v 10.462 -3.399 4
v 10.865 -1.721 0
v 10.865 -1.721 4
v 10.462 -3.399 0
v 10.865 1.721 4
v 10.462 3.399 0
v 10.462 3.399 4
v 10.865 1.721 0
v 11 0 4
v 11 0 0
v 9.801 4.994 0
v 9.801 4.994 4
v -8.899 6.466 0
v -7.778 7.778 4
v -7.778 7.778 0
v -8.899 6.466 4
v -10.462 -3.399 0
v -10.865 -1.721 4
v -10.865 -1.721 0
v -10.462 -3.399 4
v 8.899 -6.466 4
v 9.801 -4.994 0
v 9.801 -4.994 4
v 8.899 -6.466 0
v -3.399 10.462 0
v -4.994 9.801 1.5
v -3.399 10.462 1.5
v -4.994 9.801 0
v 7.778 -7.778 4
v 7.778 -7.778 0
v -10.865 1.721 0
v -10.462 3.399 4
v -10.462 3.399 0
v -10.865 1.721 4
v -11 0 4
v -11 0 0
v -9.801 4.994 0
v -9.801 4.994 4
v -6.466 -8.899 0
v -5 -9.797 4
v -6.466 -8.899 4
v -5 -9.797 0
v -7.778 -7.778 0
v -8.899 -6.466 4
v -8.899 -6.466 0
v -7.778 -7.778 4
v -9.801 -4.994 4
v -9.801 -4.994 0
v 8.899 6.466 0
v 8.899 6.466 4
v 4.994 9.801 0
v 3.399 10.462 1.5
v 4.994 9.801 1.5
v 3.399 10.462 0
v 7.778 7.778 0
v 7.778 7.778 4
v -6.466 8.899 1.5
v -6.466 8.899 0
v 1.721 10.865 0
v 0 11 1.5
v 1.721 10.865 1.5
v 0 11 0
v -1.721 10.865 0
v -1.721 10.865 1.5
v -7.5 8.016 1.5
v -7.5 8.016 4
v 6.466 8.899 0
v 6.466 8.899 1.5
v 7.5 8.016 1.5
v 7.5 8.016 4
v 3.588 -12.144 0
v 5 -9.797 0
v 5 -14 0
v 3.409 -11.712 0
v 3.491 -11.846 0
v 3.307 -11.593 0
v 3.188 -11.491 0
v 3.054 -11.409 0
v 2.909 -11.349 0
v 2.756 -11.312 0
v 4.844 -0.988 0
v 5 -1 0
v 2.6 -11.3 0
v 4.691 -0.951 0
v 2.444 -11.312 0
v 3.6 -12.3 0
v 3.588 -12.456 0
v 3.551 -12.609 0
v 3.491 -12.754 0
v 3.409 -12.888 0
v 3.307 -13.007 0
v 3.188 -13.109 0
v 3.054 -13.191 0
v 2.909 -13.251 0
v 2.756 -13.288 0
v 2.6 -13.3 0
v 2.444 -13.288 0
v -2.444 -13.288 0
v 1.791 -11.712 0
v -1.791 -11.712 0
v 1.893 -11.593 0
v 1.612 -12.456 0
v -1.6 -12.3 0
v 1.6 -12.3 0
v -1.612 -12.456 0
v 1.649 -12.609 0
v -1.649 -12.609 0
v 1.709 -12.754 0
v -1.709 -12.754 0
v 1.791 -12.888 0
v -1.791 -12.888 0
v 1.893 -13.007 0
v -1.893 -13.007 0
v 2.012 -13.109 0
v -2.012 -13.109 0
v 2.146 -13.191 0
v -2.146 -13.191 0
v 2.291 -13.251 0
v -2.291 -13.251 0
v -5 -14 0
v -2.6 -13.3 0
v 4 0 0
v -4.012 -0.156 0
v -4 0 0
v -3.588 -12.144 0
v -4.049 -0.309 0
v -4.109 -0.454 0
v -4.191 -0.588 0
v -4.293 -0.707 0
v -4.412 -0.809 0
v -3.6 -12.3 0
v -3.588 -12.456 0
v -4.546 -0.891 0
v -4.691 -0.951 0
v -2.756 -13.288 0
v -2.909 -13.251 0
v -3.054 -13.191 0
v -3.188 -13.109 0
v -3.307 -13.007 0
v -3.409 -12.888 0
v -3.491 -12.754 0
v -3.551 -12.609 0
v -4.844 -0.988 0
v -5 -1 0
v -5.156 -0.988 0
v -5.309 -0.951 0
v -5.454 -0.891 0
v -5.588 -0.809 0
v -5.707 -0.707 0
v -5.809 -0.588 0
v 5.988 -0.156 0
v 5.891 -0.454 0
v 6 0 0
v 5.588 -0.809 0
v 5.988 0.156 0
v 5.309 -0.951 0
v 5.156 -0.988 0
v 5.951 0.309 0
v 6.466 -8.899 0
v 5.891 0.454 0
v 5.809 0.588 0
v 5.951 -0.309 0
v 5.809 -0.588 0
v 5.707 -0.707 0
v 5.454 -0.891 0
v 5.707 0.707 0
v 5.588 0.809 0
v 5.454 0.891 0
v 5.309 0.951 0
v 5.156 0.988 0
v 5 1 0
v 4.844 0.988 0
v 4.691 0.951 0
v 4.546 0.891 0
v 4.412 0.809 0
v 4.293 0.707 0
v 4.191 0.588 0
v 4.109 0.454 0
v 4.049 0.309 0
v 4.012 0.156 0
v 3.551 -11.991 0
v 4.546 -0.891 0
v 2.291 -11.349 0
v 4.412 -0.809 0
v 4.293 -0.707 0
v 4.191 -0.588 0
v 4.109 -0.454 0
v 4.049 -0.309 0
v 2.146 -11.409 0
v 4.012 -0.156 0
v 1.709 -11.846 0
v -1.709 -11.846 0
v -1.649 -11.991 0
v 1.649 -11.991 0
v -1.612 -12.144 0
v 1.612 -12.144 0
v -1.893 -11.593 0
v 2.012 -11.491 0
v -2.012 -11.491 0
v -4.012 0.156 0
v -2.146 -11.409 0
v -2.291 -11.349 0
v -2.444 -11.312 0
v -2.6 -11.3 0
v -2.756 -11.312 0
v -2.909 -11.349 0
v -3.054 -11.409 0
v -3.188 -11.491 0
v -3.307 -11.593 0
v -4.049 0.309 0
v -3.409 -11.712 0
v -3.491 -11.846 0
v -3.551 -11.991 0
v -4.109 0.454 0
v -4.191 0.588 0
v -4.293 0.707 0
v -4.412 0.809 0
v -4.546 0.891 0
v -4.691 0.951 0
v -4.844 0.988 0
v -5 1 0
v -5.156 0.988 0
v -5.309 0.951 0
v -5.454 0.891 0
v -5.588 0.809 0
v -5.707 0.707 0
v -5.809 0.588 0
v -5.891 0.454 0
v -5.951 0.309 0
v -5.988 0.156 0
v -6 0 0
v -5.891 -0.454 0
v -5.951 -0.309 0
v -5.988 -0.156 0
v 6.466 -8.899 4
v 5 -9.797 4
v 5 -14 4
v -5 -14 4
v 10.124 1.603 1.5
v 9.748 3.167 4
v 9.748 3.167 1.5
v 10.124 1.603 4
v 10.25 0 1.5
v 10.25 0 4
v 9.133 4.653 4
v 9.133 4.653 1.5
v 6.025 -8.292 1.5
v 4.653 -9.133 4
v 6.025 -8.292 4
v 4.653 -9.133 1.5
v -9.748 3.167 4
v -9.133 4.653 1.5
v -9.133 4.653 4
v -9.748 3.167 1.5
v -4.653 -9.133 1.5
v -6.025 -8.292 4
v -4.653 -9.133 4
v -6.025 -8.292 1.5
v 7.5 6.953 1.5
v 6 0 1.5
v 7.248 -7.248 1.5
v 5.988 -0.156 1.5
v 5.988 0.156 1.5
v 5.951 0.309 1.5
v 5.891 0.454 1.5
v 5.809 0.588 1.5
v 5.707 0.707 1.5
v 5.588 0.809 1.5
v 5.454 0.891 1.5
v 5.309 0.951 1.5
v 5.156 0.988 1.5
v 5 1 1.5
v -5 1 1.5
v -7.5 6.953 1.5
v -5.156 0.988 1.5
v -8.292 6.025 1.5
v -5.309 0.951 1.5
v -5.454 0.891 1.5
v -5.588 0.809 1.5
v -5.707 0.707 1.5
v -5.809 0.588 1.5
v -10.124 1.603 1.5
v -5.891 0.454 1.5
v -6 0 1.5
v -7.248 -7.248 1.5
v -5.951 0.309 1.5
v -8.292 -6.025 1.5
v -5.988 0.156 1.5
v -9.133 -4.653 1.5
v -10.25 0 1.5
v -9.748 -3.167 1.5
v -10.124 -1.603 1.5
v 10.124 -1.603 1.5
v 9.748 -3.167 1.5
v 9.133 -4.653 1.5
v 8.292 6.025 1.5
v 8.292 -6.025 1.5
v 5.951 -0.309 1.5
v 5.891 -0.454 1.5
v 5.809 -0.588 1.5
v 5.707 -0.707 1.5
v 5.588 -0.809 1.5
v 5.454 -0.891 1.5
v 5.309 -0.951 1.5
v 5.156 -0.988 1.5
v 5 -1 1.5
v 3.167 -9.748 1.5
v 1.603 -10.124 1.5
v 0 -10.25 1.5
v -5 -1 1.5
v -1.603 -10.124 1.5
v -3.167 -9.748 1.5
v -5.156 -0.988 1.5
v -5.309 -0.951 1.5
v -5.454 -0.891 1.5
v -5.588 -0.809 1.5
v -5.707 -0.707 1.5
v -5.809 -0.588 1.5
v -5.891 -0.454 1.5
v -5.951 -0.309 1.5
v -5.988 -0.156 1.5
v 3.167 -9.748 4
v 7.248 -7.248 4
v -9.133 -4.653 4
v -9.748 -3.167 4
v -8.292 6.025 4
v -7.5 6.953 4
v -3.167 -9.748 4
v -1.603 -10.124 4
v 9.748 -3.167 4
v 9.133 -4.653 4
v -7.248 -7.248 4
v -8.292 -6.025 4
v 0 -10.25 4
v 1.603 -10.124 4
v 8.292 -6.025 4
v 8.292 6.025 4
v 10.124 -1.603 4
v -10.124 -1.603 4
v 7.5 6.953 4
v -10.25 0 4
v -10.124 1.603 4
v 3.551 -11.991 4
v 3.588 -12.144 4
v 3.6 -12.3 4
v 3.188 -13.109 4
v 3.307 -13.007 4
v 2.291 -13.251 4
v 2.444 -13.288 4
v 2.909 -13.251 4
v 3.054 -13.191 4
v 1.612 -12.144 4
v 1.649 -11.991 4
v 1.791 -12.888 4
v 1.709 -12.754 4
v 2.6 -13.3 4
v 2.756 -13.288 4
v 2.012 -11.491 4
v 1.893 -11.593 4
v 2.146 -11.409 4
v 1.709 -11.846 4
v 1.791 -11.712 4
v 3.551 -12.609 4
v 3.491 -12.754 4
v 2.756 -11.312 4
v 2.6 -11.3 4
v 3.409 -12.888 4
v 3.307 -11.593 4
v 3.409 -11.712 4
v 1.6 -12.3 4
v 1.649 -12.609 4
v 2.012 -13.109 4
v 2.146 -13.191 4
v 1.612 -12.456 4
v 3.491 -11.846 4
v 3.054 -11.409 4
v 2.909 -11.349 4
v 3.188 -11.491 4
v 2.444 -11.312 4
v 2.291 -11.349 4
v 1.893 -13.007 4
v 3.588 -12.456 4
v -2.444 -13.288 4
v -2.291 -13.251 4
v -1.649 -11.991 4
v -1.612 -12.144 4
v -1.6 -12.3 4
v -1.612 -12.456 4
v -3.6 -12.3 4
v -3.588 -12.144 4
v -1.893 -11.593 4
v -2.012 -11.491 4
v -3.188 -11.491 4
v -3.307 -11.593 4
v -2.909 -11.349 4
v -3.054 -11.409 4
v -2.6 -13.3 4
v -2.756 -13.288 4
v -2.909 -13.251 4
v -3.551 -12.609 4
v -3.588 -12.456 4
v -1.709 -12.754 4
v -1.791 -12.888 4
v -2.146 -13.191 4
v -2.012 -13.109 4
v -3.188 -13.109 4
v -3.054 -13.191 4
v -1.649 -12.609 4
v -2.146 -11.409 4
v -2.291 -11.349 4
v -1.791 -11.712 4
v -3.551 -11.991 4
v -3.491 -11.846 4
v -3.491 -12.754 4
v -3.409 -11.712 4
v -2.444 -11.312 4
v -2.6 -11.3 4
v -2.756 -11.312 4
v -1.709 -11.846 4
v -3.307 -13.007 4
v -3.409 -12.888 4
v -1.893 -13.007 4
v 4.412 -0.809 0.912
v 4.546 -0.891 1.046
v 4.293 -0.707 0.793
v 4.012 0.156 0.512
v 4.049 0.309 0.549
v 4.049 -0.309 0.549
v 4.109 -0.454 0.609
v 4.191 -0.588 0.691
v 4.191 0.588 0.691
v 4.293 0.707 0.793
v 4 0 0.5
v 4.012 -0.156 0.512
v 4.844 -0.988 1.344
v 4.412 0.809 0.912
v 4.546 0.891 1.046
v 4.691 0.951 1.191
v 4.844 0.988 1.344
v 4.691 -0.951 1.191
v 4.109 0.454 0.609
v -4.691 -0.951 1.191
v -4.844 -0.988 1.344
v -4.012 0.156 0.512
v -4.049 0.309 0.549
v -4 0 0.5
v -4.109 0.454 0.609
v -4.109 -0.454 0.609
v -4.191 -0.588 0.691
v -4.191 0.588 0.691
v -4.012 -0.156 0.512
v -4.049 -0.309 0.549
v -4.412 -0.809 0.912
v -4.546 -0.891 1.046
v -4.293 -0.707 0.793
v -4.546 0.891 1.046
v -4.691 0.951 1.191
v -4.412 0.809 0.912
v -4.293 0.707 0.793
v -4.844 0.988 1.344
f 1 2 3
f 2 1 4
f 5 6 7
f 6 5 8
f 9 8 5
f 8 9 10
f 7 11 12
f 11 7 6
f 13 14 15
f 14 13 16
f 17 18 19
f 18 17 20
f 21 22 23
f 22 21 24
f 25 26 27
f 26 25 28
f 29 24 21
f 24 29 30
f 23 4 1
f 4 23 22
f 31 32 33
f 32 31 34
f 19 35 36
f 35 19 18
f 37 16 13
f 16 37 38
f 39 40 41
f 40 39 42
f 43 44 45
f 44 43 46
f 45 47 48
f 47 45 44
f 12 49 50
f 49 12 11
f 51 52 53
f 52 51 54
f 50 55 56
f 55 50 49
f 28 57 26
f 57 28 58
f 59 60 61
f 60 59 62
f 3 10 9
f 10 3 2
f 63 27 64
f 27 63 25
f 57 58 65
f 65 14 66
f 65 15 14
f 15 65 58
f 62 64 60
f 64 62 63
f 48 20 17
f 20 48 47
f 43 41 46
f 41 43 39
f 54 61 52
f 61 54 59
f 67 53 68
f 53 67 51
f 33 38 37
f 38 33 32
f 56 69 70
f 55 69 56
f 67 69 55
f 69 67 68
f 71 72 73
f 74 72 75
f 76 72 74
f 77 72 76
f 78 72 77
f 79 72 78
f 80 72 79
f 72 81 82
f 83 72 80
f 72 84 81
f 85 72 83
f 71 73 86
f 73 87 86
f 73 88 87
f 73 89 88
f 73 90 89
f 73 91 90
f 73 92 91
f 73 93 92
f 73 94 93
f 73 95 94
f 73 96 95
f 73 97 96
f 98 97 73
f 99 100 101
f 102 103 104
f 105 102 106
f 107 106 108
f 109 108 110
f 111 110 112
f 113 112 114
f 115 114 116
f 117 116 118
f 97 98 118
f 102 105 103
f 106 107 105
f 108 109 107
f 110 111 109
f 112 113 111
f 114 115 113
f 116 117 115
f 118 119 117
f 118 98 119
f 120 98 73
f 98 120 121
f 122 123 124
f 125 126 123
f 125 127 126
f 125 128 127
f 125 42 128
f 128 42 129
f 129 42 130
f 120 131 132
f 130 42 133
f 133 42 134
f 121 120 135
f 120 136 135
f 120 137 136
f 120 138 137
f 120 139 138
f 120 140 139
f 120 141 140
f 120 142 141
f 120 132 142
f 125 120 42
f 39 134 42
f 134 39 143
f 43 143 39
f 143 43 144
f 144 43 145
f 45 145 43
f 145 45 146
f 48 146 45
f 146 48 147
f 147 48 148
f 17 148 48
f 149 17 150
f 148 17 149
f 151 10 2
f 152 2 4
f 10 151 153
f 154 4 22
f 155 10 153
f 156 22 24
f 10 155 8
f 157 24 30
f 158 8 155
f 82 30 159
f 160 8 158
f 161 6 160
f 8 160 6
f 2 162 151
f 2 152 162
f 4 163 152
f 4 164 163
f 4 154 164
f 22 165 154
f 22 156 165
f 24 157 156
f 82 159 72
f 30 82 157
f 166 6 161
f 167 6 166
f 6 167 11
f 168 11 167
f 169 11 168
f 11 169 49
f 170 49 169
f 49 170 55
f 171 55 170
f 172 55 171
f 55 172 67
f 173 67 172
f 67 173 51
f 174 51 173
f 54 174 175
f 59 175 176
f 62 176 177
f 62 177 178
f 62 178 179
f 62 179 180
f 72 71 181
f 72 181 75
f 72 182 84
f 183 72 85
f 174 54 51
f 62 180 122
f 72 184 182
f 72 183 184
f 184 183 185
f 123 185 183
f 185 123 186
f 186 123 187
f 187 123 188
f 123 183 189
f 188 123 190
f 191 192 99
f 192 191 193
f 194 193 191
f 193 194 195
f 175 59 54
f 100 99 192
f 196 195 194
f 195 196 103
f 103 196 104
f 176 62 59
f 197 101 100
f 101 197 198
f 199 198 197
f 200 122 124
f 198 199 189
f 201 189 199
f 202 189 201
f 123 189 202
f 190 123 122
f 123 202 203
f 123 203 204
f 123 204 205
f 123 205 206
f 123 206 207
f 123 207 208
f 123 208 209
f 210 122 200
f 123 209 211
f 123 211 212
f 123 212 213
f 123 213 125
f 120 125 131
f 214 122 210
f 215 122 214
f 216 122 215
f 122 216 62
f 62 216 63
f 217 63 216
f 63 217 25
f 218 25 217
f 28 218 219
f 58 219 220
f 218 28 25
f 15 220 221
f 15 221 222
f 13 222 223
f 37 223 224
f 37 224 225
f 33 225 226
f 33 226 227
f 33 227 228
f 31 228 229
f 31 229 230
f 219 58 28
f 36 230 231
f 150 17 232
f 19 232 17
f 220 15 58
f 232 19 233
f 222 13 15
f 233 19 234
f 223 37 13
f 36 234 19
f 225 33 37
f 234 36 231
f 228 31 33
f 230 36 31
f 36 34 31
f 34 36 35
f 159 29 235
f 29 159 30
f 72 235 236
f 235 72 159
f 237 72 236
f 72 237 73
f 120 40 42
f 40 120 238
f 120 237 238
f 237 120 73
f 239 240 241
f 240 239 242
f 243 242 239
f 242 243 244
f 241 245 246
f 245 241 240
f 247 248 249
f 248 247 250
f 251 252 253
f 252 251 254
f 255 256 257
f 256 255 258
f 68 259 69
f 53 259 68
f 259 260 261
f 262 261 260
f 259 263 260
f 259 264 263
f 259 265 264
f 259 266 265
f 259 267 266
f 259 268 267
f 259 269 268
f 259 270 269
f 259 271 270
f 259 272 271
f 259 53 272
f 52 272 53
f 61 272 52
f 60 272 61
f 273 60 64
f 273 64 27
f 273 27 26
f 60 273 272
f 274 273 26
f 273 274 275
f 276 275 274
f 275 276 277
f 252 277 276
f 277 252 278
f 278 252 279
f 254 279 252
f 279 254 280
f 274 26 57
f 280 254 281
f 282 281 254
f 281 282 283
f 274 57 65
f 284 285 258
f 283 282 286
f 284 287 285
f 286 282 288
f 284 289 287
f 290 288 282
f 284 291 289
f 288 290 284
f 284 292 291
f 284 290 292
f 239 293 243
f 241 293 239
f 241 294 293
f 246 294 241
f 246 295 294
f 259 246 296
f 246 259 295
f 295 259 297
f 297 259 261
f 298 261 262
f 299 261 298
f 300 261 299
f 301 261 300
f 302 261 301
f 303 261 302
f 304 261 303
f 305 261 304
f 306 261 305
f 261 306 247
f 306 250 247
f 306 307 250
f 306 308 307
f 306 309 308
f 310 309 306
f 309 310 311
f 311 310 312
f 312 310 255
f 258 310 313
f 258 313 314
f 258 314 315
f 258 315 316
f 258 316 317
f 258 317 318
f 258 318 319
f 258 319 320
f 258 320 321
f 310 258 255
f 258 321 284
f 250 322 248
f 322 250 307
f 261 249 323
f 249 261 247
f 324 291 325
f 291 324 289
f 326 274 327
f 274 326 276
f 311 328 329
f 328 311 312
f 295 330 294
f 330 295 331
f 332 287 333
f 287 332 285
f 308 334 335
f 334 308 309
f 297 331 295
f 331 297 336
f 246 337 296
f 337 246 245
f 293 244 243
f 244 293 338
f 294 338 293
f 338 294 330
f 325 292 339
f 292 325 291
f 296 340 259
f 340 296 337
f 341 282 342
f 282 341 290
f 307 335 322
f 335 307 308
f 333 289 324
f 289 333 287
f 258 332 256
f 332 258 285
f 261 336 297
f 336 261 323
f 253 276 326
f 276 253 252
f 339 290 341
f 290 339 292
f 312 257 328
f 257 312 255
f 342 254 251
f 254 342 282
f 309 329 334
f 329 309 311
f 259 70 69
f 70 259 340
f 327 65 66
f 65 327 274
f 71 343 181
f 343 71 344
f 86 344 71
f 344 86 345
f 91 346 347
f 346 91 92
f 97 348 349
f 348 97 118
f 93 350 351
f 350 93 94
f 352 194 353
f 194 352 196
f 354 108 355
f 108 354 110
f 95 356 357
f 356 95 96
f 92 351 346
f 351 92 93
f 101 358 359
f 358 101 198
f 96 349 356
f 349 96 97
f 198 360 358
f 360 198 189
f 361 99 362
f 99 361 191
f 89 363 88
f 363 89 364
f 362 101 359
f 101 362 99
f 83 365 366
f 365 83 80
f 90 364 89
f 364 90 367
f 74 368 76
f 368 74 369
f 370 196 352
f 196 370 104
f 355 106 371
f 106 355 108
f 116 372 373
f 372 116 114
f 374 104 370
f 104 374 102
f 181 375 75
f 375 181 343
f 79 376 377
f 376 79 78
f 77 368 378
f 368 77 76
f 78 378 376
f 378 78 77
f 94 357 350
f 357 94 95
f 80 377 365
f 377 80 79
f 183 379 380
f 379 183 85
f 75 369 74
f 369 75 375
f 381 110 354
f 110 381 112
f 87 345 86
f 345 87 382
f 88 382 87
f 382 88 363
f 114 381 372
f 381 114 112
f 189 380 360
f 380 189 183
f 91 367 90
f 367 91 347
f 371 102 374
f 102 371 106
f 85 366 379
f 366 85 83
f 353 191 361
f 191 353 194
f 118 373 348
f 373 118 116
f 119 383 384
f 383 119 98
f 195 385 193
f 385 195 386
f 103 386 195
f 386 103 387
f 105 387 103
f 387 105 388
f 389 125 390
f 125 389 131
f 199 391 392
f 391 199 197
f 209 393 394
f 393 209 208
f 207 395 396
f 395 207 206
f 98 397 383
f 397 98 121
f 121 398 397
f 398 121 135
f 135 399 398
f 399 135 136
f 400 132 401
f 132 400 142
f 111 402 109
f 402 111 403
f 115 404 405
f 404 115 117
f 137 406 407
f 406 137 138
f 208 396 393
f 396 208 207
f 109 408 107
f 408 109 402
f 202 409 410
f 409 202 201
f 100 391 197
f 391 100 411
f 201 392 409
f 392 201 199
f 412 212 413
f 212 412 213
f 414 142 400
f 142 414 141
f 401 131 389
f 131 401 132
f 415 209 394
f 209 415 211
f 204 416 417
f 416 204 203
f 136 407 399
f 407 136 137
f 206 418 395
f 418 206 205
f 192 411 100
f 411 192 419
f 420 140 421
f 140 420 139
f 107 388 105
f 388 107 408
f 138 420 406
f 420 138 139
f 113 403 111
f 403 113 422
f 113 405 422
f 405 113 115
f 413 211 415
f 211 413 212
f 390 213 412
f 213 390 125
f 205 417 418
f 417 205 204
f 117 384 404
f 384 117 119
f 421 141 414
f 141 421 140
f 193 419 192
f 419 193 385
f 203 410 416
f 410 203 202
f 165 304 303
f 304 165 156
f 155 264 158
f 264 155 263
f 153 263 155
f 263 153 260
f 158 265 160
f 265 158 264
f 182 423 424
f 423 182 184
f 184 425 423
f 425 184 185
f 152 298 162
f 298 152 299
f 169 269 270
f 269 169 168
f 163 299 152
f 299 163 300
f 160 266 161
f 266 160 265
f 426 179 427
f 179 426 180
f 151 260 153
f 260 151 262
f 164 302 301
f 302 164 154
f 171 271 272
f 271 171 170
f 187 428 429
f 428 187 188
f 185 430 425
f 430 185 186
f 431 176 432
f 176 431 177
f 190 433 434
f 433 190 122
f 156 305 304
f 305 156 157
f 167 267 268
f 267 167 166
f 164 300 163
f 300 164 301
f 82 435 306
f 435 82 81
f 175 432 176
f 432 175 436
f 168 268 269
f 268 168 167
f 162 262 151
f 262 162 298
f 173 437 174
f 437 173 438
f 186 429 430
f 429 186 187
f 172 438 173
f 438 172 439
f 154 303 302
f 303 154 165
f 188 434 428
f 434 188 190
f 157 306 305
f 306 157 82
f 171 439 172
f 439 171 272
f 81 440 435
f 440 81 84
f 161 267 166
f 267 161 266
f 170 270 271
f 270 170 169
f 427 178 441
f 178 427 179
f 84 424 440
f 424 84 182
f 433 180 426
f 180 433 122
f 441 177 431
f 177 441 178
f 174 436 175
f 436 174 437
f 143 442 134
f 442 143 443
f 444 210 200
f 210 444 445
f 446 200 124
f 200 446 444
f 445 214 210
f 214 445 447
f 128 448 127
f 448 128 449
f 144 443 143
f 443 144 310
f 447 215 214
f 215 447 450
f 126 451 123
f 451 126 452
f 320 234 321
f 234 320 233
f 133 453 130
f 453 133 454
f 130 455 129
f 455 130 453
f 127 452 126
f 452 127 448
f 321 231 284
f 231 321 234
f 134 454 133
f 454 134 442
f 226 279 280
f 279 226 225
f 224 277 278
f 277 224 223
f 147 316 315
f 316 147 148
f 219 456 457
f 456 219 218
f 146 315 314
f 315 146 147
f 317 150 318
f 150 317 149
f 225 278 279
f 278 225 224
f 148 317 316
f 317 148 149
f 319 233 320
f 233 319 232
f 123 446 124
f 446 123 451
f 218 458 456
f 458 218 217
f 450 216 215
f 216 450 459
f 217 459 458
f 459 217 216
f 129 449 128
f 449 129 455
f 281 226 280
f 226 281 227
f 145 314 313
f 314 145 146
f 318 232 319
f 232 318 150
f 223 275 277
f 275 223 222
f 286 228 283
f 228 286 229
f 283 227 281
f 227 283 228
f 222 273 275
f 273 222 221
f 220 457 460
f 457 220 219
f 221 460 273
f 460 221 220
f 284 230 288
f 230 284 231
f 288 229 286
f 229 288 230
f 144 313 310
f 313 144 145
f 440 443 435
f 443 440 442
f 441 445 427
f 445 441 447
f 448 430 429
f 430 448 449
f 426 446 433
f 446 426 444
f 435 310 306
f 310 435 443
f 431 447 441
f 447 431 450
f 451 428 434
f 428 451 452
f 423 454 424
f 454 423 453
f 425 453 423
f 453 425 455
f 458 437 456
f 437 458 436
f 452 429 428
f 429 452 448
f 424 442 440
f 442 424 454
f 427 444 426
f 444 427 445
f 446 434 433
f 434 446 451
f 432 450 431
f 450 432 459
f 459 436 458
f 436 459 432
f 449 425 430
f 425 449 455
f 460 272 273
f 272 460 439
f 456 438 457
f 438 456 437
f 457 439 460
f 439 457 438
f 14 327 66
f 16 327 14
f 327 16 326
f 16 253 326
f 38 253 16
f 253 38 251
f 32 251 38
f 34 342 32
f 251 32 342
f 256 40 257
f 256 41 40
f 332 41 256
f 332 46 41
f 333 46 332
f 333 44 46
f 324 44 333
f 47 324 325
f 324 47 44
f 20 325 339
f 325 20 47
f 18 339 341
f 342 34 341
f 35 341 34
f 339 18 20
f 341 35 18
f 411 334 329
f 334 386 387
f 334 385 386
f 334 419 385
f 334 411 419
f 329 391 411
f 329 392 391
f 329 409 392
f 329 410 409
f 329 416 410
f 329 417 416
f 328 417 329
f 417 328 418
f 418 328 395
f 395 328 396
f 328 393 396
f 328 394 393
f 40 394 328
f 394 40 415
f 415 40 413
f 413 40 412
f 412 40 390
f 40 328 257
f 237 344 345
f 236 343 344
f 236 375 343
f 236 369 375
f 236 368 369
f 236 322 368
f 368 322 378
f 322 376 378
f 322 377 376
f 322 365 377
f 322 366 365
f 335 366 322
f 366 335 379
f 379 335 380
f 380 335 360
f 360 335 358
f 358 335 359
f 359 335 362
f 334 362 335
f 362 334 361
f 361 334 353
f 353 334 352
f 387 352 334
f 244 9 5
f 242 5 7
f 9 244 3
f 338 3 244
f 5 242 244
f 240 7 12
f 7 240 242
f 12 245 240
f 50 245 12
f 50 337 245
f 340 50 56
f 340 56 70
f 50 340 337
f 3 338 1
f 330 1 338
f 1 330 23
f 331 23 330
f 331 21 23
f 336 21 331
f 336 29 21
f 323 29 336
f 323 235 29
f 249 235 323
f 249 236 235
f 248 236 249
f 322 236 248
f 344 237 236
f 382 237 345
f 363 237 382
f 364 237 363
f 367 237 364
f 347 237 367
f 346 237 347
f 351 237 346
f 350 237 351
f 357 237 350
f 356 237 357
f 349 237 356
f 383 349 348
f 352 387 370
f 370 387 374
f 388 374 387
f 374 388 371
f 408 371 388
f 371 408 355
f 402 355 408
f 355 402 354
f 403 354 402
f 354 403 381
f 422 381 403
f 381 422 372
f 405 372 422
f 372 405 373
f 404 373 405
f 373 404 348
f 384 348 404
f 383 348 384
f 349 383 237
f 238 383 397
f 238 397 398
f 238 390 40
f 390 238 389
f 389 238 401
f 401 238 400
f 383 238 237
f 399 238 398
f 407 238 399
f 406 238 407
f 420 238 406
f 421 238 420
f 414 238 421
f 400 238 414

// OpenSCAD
//%translate([12.5,-35,0])
//	rotate([0,0,90])
	
	
// % import("C:\\misc\\scad\\BatHolder2032_1-0.stl");

/* [General] */

//
BatteryTypes = "CR2032"; //[CR2032, test]

// 
NumberOfBatteries = 1; //[1:5]

/* [Hidden] */

batteryWidth = 20;
batteryHeigth = 1.5;
$fn=40;	
	
baseHeigth = 40;


// Return the current value if not found.

batteryWidth = BatteryTypes == "CR2032" ? 20 : batteryWidth ;
//batteryWidth = BatteryTypes == "CR2032" ? 20 : batteryWidth ;
//batteryWidth = BatteryTypes == "CR2032" ? 20 : batteryWidth ;


batteryHeigth = BatteryTypes == "CR2032" ? 1.5 : batteryHeigth ;
//batteryHeigth = BatteryTypes == "CR2032" ? 1.5 : batteryHeigth ;
//batteryHeigth = BatteryTypes == "CR2032" ? 1.5 : batteryHeigth ;

spaceForbatteries = batteryHeigth * NumberOfBatteries;

difference(){
	difference(){
		union(){
			translate([0,0,(baseHeigth/2)]) cylinder(d=batteryWidth + 2, h=baseHeigth, center=true); // Outer cylinder
			translate([0,-11,(baseHeigth/2)]) cube([10,6,baseHeigth],center=true); // back support
		}
		union(){
			translate([0,0,(baseHeigth/2)+1.5]) cylinder(d=batteryWidth + .5, h=baseHeigth, center=true); // inner cylinder cutout	

			translate([0,9,(baseHeigth/2)+1.5]) cube([15,7,baseHeigth],center=true); // Front cutout	

			translate([2.6,-12.3,(baseHeigth/2)]) cylinder(d=2, h=baseHeigth+2,center=true); // Back support wire cutout
				translate([-2.6,-12.3,(baseHeigth/2)]) cylinder(d=2, h=baseHeigth+2,center=true); // Back support wire cutout
	
			translate([5,0]) cylinder(d=2, h=5,center=true); // Bottom virtical cutout
			translate([-5,0]) cylinder(d=2, h=5,center=true); // Bottom virtical cutout
			translate([0,0,1.5]) rotate([0,90,0]) cylinder(d=2, h=10,center=true); // Bottom horizontal cutout
		}
	}
	translate([0,0,((baseHeigth/2)+2.5) + spaceForbatteries]) cube([30,30,40], center=true); // Move up to fit more batteries
}
